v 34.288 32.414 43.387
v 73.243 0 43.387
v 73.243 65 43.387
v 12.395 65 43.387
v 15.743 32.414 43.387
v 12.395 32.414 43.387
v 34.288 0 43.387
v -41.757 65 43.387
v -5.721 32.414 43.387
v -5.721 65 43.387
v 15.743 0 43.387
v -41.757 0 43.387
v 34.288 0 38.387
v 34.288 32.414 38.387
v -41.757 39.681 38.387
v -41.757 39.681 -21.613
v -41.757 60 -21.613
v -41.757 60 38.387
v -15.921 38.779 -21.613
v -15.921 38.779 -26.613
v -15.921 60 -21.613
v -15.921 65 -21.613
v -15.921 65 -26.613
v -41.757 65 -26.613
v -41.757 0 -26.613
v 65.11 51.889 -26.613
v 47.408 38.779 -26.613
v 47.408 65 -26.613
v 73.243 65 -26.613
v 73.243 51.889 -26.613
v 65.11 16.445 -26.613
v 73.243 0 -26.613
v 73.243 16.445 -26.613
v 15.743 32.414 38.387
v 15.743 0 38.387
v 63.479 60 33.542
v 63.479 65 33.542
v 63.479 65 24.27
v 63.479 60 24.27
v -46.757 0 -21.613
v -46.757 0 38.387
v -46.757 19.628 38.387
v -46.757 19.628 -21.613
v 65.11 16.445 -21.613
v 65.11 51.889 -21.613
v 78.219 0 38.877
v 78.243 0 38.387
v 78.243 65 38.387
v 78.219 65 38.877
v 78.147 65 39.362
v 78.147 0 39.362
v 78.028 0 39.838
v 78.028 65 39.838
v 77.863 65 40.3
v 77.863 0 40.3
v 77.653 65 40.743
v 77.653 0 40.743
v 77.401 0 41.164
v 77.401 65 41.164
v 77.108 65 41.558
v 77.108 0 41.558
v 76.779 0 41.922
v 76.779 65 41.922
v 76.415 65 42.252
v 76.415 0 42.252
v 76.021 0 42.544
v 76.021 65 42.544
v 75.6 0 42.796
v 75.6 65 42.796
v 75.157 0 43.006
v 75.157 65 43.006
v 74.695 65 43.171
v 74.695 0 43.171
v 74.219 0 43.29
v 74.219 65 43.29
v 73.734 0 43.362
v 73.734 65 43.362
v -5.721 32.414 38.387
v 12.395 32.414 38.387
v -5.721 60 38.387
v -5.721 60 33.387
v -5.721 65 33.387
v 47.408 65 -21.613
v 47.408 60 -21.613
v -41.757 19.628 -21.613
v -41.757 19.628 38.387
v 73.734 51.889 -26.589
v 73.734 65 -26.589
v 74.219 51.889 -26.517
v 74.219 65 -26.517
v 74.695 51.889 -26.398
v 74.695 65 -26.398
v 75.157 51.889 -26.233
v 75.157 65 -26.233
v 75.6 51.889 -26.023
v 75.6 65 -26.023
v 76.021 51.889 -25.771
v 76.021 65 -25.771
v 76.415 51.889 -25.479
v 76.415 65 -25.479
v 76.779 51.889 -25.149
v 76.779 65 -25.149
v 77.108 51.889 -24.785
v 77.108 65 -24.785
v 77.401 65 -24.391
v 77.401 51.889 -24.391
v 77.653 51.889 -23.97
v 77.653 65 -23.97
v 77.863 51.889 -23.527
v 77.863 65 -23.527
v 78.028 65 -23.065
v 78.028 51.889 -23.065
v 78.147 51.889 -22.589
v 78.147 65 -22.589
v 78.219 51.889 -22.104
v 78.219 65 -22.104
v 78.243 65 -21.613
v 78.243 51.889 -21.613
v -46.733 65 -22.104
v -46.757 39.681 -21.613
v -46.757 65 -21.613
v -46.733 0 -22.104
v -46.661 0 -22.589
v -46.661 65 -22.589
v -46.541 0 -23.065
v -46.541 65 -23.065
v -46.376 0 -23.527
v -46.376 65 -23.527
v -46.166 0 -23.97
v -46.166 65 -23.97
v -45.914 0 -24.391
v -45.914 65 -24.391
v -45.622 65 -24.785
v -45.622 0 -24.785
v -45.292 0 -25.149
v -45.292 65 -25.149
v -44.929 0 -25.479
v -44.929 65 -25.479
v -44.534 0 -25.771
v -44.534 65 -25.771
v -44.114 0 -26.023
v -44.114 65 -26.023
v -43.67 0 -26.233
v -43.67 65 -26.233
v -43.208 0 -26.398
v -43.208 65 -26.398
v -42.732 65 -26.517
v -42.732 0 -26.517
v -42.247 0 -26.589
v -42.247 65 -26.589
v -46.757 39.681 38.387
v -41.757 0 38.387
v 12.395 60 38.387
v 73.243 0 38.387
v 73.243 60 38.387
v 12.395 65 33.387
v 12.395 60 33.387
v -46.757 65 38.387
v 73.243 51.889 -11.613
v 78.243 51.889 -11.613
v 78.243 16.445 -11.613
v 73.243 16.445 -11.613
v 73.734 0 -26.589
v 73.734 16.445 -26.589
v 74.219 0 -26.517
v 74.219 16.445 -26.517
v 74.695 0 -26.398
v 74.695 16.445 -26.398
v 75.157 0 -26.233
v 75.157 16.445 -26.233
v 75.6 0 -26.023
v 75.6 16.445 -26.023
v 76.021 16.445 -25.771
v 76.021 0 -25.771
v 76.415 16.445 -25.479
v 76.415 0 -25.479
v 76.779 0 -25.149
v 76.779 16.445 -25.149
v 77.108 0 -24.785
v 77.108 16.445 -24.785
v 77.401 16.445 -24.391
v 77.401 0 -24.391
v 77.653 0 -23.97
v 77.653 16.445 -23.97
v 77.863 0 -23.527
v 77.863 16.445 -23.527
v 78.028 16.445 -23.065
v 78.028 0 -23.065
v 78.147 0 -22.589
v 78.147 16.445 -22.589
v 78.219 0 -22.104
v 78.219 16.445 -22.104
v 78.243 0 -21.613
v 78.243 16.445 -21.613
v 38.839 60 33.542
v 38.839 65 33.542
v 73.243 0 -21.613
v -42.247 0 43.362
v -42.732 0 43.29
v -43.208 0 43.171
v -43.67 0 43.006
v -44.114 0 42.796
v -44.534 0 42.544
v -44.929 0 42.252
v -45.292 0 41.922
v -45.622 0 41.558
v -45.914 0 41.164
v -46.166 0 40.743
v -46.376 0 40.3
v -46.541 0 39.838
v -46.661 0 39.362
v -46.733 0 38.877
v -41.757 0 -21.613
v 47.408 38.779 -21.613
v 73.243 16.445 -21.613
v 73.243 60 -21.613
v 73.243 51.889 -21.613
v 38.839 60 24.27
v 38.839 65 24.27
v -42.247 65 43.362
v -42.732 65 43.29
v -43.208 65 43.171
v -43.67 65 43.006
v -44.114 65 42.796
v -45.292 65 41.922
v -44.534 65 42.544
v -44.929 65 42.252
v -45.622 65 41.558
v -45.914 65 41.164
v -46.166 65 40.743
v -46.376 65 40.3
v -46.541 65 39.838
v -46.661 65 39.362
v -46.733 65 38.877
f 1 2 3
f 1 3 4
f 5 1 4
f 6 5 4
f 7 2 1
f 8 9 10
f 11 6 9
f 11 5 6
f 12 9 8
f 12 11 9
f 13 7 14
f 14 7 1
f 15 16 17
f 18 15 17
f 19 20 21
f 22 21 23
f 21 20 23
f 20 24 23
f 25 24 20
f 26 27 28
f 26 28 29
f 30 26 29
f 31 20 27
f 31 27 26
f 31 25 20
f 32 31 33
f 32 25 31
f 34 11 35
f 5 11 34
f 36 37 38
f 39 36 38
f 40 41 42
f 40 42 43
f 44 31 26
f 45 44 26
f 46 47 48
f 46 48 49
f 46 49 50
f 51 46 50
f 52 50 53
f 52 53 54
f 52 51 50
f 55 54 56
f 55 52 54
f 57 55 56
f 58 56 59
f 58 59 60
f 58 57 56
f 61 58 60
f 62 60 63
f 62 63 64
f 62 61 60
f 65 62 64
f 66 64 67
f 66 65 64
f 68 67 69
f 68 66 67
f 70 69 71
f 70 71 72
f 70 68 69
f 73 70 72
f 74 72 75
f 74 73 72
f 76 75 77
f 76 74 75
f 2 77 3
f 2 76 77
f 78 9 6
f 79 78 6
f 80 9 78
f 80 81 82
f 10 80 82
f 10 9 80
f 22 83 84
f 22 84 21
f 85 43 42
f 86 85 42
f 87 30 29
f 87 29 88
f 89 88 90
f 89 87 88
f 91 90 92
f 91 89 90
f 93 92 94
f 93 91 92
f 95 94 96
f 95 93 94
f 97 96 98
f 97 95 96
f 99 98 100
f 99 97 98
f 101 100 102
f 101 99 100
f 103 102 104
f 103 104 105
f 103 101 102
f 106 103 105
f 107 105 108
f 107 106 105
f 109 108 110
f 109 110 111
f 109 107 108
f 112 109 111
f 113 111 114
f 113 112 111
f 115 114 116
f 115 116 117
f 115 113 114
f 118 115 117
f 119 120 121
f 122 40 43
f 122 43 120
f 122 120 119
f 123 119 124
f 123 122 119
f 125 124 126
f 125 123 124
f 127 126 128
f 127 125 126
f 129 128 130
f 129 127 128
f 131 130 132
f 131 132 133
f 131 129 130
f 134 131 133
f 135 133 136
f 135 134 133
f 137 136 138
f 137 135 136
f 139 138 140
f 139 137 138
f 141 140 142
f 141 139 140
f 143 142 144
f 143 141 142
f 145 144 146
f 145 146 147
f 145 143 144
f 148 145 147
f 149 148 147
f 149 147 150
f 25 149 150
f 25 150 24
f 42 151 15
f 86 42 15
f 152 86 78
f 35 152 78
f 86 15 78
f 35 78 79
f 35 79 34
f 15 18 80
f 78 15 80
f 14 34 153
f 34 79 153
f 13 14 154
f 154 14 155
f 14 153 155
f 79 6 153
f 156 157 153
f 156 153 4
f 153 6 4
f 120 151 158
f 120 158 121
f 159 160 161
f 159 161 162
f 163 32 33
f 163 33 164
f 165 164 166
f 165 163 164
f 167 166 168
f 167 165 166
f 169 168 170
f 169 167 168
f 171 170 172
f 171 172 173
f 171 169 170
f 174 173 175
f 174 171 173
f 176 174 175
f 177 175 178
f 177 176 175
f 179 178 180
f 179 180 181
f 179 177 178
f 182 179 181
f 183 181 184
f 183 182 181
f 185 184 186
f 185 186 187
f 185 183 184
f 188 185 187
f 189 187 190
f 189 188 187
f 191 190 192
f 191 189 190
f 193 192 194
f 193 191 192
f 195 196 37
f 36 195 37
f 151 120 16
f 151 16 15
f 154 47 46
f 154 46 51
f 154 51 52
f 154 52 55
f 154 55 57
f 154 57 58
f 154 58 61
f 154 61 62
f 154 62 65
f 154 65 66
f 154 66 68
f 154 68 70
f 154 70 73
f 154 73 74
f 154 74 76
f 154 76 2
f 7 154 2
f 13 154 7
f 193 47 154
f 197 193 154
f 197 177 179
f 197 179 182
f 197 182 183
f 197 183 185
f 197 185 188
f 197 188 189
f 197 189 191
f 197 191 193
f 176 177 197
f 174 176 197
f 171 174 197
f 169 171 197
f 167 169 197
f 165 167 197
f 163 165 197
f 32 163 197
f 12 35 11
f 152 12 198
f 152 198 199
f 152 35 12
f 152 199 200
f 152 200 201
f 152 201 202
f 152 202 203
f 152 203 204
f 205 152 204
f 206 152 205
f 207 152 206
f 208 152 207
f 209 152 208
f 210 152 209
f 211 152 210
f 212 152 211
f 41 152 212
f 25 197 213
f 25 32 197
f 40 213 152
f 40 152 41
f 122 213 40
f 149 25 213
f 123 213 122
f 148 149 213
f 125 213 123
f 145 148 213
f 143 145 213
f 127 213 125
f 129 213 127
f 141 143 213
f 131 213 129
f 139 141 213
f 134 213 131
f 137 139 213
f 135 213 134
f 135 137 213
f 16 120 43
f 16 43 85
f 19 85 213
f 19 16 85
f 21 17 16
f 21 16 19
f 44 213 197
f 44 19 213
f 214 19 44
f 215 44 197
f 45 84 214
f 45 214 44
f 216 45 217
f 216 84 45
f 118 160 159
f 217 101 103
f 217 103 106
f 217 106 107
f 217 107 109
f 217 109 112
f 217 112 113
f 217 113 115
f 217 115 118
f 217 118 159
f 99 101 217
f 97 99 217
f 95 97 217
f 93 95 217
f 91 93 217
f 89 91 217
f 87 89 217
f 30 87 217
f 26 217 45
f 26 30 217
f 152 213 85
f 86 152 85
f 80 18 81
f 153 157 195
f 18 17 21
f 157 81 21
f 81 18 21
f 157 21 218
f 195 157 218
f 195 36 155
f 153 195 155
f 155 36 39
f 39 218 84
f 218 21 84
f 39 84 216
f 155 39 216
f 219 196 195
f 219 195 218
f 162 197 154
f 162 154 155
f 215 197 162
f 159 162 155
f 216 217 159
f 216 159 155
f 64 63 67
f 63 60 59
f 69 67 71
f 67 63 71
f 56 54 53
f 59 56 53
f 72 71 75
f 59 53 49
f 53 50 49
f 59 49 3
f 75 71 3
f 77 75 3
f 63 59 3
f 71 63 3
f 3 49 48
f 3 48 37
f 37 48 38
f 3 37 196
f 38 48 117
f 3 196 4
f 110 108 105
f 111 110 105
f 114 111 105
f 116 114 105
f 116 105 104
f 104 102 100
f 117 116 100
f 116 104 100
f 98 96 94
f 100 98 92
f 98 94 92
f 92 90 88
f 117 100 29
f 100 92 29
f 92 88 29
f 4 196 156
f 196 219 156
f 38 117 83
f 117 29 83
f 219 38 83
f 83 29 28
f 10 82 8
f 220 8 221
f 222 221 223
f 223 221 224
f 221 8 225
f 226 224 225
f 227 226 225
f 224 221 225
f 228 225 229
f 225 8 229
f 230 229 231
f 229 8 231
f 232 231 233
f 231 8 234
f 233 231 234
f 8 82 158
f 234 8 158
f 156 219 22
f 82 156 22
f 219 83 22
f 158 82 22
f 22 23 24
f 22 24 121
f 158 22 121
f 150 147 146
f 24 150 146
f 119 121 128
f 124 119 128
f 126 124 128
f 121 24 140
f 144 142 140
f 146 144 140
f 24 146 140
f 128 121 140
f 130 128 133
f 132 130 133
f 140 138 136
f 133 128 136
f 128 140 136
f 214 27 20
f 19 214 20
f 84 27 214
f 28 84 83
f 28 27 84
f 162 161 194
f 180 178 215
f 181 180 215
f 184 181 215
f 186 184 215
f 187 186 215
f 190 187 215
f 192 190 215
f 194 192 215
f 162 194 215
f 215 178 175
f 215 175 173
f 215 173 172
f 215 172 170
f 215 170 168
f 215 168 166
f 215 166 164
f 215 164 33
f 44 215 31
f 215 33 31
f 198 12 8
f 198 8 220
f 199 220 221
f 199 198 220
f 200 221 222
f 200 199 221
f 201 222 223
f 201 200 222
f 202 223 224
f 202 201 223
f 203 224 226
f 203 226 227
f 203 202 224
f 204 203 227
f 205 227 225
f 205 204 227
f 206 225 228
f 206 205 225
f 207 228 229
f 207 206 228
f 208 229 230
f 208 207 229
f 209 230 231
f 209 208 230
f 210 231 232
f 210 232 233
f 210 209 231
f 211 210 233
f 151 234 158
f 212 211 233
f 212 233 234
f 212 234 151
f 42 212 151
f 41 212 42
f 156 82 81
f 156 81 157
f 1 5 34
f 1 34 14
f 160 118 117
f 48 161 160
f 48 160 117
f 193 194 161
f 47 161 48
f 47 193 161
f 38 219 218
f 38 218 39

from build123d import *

# Parameters (mm, degrees)
EXTRUDE_5_DEPTH     = 65
SHELL_START         = -21.613486842
SHELL_8_OUTLINE_W   = 115
SHELL_8_OUTLINE_H   = 60
SHELL_8_DEPTH       = 60
SKETCH_7_W          = 18.544828657
SKETCH_7_H          = 32.414144312
CUT_EXTRUDE_1_DEPTH = 10
SKETCH_8_W          = 18.115550217
SKETCH_8_H          = 32.585855688
CUT_EXTRUDE_2_DEPTH = 10
SKETCH_9_W          = 63.329623263
SKETCH_9_H          = 52.442260972
CUT_EXTRUDE_3_DEPTH = 5
SKETCH_10_W         = 13.132979269
SKETCH_10_H         = 35.444448456
CUT_EXTRUDE_4_DEPTH = 15
SKETCH_11_W         = 60
SKETCH_11_H         = 20.052739579
CUT_EXTRUDE_5_DEPTH = 5
SKETCH_12_W         = 24.640582522
SKETCH_12_H         = 9.272414329
CUT_EXTRUDE_6_DEPTH = 5


# Read off the part's stored shape, not the designer's step: 抽壳8
with BuildPart() as part:
    # 草图1<7> → 凸台-拉伸5 (new body)
    with BuildSketch(Plane(origin=(0, 0, 0), x_dir=(1, 0, 0), z_dir=(0, 1, 0))):
        with BuildLine():
            Line((-41.756578947, 26.613486842), (73.243421053, 26.613486842))
            ThreePointArc((73.243421053, 26.613486842), (76.778954959, 25.149020748), (78.243421053, 21.613486842))
            Line((78.243421053, 21.613486842), (78.243421053, -38.386513158))
            ThreePointArc((78.243421053, -38.386513158), (76.778954959, -41.922047064), (73.243421053, -43.386513158))
            Line((73.243421053, -43.386513158), (-41.756578947, -43.386513158))
            ThreePointArc((-41.756578947, -43.386513158), (-45.292112853, -41.922047064), (-46.756578947, -38.386513158))
            Line((-46.756578947, -38.386513158), (-46.756578947, 21.613486842))
            ThreePointArc((-46.756578947, 21.613486842), (-45.292112853, 25.149020748), (-41.756578947, 26.613486842))
        make_face()
    extrude(amount=EXTRUDE_5_DEPTH)

    # 抽壳8 outline → 抽壳8 (cut)
    with BuildSketch(Plane.XY.offset(SHELL_START)):
        with Locations((15.743421053, 30)):
            Rectangle(SHELL_8_OUTLINE_W, SHELL_8_OUTLINE_H)
    extrude(amount=SHELL_8_DEPTH, mode=Mode.SUBTRACT)

    # 草图7 → 切除-拉伸1 (cut)
    with BuildSketch(Plane.XY.offset(43.386513158)):
        with Locations((25.015835382, 16.207072156)):
            Rectangle(SKETCH_7_W, SKETCH_7_H)
    extrude(amount=-CUT_EXTRUDE_1_DEPTH, mode=Mode.SUBTRACT)

    # 草图8 → 切除-拉伸2 (cut)
    with BuildSketch(Plane.XY.offset(43.386513158)):
        with Locations((3.337274103, 48.707072156)):
            Rectangle(SKETCH_8_W, SKETCH_8_H)
    extrude(amount=-CUT_EXTRUDE_2_DEPTH, mode=Mode.SUBTRACT)

    # 草图9 → 切除-拉伸3 (cut)
    with BuildSketch(Plane(origin=(0, 0, -26.613486842), x_dir=(-1, 0, 0), z_dir=(0, 0, -1))):
        with Locations((-15.743421053, 65)):
            Rectangle(SKETCH_9_W, SKETCH_9_H)
    extrude(amount=-CUT_EXTRUDE_3_DEPTH, mode=Mode.SUBTRACT)

    # 草图10 → 切除-拉伸4 (cut)
    with BuildSketch(Plane(origin=(0, 0, -26.613486842), x_dir=(-1, 0, 0), z_dir=(0, 0, -1))):
        with Locations((-71.676931419, 34.167210529)):
            Rectangle(SKETCH_10_W, SKETCH_10_H)
    extrude(amount=-CUT_EXTRUDE_4_DEPTH, mode=Mode.SUBTRACT)

    # 草图11 → 切除-拉伸5 (cut)
    with BuildSketch(Plane.ZY.offset(46.756578947)):
        with Locations((8.386513158, 29.654328955)):
            Rectangle(SKETCH_11_W, SKETCH_11_H)
    extrude(amount=-CUT_EXTRUDE_5_DEPTH, mode=Mode.SUBTRACT)

    # 草图12 → 切除-拉伸6 (cut)
    with BuildSketch(Plane(origin=(0, 65, 0), x_dir=(1, 0, 0), z_dir=(0, 1, 0))):
        with Locations((51.158892447, -28.906022645)):
            Rectangle(SKETCH_12_W, SKETCH_12_H)
    extrude(amount=-CUT_EXTRUDE_6_DEPTH, mode=Mode.SUBTRACT)


solid = part.part
